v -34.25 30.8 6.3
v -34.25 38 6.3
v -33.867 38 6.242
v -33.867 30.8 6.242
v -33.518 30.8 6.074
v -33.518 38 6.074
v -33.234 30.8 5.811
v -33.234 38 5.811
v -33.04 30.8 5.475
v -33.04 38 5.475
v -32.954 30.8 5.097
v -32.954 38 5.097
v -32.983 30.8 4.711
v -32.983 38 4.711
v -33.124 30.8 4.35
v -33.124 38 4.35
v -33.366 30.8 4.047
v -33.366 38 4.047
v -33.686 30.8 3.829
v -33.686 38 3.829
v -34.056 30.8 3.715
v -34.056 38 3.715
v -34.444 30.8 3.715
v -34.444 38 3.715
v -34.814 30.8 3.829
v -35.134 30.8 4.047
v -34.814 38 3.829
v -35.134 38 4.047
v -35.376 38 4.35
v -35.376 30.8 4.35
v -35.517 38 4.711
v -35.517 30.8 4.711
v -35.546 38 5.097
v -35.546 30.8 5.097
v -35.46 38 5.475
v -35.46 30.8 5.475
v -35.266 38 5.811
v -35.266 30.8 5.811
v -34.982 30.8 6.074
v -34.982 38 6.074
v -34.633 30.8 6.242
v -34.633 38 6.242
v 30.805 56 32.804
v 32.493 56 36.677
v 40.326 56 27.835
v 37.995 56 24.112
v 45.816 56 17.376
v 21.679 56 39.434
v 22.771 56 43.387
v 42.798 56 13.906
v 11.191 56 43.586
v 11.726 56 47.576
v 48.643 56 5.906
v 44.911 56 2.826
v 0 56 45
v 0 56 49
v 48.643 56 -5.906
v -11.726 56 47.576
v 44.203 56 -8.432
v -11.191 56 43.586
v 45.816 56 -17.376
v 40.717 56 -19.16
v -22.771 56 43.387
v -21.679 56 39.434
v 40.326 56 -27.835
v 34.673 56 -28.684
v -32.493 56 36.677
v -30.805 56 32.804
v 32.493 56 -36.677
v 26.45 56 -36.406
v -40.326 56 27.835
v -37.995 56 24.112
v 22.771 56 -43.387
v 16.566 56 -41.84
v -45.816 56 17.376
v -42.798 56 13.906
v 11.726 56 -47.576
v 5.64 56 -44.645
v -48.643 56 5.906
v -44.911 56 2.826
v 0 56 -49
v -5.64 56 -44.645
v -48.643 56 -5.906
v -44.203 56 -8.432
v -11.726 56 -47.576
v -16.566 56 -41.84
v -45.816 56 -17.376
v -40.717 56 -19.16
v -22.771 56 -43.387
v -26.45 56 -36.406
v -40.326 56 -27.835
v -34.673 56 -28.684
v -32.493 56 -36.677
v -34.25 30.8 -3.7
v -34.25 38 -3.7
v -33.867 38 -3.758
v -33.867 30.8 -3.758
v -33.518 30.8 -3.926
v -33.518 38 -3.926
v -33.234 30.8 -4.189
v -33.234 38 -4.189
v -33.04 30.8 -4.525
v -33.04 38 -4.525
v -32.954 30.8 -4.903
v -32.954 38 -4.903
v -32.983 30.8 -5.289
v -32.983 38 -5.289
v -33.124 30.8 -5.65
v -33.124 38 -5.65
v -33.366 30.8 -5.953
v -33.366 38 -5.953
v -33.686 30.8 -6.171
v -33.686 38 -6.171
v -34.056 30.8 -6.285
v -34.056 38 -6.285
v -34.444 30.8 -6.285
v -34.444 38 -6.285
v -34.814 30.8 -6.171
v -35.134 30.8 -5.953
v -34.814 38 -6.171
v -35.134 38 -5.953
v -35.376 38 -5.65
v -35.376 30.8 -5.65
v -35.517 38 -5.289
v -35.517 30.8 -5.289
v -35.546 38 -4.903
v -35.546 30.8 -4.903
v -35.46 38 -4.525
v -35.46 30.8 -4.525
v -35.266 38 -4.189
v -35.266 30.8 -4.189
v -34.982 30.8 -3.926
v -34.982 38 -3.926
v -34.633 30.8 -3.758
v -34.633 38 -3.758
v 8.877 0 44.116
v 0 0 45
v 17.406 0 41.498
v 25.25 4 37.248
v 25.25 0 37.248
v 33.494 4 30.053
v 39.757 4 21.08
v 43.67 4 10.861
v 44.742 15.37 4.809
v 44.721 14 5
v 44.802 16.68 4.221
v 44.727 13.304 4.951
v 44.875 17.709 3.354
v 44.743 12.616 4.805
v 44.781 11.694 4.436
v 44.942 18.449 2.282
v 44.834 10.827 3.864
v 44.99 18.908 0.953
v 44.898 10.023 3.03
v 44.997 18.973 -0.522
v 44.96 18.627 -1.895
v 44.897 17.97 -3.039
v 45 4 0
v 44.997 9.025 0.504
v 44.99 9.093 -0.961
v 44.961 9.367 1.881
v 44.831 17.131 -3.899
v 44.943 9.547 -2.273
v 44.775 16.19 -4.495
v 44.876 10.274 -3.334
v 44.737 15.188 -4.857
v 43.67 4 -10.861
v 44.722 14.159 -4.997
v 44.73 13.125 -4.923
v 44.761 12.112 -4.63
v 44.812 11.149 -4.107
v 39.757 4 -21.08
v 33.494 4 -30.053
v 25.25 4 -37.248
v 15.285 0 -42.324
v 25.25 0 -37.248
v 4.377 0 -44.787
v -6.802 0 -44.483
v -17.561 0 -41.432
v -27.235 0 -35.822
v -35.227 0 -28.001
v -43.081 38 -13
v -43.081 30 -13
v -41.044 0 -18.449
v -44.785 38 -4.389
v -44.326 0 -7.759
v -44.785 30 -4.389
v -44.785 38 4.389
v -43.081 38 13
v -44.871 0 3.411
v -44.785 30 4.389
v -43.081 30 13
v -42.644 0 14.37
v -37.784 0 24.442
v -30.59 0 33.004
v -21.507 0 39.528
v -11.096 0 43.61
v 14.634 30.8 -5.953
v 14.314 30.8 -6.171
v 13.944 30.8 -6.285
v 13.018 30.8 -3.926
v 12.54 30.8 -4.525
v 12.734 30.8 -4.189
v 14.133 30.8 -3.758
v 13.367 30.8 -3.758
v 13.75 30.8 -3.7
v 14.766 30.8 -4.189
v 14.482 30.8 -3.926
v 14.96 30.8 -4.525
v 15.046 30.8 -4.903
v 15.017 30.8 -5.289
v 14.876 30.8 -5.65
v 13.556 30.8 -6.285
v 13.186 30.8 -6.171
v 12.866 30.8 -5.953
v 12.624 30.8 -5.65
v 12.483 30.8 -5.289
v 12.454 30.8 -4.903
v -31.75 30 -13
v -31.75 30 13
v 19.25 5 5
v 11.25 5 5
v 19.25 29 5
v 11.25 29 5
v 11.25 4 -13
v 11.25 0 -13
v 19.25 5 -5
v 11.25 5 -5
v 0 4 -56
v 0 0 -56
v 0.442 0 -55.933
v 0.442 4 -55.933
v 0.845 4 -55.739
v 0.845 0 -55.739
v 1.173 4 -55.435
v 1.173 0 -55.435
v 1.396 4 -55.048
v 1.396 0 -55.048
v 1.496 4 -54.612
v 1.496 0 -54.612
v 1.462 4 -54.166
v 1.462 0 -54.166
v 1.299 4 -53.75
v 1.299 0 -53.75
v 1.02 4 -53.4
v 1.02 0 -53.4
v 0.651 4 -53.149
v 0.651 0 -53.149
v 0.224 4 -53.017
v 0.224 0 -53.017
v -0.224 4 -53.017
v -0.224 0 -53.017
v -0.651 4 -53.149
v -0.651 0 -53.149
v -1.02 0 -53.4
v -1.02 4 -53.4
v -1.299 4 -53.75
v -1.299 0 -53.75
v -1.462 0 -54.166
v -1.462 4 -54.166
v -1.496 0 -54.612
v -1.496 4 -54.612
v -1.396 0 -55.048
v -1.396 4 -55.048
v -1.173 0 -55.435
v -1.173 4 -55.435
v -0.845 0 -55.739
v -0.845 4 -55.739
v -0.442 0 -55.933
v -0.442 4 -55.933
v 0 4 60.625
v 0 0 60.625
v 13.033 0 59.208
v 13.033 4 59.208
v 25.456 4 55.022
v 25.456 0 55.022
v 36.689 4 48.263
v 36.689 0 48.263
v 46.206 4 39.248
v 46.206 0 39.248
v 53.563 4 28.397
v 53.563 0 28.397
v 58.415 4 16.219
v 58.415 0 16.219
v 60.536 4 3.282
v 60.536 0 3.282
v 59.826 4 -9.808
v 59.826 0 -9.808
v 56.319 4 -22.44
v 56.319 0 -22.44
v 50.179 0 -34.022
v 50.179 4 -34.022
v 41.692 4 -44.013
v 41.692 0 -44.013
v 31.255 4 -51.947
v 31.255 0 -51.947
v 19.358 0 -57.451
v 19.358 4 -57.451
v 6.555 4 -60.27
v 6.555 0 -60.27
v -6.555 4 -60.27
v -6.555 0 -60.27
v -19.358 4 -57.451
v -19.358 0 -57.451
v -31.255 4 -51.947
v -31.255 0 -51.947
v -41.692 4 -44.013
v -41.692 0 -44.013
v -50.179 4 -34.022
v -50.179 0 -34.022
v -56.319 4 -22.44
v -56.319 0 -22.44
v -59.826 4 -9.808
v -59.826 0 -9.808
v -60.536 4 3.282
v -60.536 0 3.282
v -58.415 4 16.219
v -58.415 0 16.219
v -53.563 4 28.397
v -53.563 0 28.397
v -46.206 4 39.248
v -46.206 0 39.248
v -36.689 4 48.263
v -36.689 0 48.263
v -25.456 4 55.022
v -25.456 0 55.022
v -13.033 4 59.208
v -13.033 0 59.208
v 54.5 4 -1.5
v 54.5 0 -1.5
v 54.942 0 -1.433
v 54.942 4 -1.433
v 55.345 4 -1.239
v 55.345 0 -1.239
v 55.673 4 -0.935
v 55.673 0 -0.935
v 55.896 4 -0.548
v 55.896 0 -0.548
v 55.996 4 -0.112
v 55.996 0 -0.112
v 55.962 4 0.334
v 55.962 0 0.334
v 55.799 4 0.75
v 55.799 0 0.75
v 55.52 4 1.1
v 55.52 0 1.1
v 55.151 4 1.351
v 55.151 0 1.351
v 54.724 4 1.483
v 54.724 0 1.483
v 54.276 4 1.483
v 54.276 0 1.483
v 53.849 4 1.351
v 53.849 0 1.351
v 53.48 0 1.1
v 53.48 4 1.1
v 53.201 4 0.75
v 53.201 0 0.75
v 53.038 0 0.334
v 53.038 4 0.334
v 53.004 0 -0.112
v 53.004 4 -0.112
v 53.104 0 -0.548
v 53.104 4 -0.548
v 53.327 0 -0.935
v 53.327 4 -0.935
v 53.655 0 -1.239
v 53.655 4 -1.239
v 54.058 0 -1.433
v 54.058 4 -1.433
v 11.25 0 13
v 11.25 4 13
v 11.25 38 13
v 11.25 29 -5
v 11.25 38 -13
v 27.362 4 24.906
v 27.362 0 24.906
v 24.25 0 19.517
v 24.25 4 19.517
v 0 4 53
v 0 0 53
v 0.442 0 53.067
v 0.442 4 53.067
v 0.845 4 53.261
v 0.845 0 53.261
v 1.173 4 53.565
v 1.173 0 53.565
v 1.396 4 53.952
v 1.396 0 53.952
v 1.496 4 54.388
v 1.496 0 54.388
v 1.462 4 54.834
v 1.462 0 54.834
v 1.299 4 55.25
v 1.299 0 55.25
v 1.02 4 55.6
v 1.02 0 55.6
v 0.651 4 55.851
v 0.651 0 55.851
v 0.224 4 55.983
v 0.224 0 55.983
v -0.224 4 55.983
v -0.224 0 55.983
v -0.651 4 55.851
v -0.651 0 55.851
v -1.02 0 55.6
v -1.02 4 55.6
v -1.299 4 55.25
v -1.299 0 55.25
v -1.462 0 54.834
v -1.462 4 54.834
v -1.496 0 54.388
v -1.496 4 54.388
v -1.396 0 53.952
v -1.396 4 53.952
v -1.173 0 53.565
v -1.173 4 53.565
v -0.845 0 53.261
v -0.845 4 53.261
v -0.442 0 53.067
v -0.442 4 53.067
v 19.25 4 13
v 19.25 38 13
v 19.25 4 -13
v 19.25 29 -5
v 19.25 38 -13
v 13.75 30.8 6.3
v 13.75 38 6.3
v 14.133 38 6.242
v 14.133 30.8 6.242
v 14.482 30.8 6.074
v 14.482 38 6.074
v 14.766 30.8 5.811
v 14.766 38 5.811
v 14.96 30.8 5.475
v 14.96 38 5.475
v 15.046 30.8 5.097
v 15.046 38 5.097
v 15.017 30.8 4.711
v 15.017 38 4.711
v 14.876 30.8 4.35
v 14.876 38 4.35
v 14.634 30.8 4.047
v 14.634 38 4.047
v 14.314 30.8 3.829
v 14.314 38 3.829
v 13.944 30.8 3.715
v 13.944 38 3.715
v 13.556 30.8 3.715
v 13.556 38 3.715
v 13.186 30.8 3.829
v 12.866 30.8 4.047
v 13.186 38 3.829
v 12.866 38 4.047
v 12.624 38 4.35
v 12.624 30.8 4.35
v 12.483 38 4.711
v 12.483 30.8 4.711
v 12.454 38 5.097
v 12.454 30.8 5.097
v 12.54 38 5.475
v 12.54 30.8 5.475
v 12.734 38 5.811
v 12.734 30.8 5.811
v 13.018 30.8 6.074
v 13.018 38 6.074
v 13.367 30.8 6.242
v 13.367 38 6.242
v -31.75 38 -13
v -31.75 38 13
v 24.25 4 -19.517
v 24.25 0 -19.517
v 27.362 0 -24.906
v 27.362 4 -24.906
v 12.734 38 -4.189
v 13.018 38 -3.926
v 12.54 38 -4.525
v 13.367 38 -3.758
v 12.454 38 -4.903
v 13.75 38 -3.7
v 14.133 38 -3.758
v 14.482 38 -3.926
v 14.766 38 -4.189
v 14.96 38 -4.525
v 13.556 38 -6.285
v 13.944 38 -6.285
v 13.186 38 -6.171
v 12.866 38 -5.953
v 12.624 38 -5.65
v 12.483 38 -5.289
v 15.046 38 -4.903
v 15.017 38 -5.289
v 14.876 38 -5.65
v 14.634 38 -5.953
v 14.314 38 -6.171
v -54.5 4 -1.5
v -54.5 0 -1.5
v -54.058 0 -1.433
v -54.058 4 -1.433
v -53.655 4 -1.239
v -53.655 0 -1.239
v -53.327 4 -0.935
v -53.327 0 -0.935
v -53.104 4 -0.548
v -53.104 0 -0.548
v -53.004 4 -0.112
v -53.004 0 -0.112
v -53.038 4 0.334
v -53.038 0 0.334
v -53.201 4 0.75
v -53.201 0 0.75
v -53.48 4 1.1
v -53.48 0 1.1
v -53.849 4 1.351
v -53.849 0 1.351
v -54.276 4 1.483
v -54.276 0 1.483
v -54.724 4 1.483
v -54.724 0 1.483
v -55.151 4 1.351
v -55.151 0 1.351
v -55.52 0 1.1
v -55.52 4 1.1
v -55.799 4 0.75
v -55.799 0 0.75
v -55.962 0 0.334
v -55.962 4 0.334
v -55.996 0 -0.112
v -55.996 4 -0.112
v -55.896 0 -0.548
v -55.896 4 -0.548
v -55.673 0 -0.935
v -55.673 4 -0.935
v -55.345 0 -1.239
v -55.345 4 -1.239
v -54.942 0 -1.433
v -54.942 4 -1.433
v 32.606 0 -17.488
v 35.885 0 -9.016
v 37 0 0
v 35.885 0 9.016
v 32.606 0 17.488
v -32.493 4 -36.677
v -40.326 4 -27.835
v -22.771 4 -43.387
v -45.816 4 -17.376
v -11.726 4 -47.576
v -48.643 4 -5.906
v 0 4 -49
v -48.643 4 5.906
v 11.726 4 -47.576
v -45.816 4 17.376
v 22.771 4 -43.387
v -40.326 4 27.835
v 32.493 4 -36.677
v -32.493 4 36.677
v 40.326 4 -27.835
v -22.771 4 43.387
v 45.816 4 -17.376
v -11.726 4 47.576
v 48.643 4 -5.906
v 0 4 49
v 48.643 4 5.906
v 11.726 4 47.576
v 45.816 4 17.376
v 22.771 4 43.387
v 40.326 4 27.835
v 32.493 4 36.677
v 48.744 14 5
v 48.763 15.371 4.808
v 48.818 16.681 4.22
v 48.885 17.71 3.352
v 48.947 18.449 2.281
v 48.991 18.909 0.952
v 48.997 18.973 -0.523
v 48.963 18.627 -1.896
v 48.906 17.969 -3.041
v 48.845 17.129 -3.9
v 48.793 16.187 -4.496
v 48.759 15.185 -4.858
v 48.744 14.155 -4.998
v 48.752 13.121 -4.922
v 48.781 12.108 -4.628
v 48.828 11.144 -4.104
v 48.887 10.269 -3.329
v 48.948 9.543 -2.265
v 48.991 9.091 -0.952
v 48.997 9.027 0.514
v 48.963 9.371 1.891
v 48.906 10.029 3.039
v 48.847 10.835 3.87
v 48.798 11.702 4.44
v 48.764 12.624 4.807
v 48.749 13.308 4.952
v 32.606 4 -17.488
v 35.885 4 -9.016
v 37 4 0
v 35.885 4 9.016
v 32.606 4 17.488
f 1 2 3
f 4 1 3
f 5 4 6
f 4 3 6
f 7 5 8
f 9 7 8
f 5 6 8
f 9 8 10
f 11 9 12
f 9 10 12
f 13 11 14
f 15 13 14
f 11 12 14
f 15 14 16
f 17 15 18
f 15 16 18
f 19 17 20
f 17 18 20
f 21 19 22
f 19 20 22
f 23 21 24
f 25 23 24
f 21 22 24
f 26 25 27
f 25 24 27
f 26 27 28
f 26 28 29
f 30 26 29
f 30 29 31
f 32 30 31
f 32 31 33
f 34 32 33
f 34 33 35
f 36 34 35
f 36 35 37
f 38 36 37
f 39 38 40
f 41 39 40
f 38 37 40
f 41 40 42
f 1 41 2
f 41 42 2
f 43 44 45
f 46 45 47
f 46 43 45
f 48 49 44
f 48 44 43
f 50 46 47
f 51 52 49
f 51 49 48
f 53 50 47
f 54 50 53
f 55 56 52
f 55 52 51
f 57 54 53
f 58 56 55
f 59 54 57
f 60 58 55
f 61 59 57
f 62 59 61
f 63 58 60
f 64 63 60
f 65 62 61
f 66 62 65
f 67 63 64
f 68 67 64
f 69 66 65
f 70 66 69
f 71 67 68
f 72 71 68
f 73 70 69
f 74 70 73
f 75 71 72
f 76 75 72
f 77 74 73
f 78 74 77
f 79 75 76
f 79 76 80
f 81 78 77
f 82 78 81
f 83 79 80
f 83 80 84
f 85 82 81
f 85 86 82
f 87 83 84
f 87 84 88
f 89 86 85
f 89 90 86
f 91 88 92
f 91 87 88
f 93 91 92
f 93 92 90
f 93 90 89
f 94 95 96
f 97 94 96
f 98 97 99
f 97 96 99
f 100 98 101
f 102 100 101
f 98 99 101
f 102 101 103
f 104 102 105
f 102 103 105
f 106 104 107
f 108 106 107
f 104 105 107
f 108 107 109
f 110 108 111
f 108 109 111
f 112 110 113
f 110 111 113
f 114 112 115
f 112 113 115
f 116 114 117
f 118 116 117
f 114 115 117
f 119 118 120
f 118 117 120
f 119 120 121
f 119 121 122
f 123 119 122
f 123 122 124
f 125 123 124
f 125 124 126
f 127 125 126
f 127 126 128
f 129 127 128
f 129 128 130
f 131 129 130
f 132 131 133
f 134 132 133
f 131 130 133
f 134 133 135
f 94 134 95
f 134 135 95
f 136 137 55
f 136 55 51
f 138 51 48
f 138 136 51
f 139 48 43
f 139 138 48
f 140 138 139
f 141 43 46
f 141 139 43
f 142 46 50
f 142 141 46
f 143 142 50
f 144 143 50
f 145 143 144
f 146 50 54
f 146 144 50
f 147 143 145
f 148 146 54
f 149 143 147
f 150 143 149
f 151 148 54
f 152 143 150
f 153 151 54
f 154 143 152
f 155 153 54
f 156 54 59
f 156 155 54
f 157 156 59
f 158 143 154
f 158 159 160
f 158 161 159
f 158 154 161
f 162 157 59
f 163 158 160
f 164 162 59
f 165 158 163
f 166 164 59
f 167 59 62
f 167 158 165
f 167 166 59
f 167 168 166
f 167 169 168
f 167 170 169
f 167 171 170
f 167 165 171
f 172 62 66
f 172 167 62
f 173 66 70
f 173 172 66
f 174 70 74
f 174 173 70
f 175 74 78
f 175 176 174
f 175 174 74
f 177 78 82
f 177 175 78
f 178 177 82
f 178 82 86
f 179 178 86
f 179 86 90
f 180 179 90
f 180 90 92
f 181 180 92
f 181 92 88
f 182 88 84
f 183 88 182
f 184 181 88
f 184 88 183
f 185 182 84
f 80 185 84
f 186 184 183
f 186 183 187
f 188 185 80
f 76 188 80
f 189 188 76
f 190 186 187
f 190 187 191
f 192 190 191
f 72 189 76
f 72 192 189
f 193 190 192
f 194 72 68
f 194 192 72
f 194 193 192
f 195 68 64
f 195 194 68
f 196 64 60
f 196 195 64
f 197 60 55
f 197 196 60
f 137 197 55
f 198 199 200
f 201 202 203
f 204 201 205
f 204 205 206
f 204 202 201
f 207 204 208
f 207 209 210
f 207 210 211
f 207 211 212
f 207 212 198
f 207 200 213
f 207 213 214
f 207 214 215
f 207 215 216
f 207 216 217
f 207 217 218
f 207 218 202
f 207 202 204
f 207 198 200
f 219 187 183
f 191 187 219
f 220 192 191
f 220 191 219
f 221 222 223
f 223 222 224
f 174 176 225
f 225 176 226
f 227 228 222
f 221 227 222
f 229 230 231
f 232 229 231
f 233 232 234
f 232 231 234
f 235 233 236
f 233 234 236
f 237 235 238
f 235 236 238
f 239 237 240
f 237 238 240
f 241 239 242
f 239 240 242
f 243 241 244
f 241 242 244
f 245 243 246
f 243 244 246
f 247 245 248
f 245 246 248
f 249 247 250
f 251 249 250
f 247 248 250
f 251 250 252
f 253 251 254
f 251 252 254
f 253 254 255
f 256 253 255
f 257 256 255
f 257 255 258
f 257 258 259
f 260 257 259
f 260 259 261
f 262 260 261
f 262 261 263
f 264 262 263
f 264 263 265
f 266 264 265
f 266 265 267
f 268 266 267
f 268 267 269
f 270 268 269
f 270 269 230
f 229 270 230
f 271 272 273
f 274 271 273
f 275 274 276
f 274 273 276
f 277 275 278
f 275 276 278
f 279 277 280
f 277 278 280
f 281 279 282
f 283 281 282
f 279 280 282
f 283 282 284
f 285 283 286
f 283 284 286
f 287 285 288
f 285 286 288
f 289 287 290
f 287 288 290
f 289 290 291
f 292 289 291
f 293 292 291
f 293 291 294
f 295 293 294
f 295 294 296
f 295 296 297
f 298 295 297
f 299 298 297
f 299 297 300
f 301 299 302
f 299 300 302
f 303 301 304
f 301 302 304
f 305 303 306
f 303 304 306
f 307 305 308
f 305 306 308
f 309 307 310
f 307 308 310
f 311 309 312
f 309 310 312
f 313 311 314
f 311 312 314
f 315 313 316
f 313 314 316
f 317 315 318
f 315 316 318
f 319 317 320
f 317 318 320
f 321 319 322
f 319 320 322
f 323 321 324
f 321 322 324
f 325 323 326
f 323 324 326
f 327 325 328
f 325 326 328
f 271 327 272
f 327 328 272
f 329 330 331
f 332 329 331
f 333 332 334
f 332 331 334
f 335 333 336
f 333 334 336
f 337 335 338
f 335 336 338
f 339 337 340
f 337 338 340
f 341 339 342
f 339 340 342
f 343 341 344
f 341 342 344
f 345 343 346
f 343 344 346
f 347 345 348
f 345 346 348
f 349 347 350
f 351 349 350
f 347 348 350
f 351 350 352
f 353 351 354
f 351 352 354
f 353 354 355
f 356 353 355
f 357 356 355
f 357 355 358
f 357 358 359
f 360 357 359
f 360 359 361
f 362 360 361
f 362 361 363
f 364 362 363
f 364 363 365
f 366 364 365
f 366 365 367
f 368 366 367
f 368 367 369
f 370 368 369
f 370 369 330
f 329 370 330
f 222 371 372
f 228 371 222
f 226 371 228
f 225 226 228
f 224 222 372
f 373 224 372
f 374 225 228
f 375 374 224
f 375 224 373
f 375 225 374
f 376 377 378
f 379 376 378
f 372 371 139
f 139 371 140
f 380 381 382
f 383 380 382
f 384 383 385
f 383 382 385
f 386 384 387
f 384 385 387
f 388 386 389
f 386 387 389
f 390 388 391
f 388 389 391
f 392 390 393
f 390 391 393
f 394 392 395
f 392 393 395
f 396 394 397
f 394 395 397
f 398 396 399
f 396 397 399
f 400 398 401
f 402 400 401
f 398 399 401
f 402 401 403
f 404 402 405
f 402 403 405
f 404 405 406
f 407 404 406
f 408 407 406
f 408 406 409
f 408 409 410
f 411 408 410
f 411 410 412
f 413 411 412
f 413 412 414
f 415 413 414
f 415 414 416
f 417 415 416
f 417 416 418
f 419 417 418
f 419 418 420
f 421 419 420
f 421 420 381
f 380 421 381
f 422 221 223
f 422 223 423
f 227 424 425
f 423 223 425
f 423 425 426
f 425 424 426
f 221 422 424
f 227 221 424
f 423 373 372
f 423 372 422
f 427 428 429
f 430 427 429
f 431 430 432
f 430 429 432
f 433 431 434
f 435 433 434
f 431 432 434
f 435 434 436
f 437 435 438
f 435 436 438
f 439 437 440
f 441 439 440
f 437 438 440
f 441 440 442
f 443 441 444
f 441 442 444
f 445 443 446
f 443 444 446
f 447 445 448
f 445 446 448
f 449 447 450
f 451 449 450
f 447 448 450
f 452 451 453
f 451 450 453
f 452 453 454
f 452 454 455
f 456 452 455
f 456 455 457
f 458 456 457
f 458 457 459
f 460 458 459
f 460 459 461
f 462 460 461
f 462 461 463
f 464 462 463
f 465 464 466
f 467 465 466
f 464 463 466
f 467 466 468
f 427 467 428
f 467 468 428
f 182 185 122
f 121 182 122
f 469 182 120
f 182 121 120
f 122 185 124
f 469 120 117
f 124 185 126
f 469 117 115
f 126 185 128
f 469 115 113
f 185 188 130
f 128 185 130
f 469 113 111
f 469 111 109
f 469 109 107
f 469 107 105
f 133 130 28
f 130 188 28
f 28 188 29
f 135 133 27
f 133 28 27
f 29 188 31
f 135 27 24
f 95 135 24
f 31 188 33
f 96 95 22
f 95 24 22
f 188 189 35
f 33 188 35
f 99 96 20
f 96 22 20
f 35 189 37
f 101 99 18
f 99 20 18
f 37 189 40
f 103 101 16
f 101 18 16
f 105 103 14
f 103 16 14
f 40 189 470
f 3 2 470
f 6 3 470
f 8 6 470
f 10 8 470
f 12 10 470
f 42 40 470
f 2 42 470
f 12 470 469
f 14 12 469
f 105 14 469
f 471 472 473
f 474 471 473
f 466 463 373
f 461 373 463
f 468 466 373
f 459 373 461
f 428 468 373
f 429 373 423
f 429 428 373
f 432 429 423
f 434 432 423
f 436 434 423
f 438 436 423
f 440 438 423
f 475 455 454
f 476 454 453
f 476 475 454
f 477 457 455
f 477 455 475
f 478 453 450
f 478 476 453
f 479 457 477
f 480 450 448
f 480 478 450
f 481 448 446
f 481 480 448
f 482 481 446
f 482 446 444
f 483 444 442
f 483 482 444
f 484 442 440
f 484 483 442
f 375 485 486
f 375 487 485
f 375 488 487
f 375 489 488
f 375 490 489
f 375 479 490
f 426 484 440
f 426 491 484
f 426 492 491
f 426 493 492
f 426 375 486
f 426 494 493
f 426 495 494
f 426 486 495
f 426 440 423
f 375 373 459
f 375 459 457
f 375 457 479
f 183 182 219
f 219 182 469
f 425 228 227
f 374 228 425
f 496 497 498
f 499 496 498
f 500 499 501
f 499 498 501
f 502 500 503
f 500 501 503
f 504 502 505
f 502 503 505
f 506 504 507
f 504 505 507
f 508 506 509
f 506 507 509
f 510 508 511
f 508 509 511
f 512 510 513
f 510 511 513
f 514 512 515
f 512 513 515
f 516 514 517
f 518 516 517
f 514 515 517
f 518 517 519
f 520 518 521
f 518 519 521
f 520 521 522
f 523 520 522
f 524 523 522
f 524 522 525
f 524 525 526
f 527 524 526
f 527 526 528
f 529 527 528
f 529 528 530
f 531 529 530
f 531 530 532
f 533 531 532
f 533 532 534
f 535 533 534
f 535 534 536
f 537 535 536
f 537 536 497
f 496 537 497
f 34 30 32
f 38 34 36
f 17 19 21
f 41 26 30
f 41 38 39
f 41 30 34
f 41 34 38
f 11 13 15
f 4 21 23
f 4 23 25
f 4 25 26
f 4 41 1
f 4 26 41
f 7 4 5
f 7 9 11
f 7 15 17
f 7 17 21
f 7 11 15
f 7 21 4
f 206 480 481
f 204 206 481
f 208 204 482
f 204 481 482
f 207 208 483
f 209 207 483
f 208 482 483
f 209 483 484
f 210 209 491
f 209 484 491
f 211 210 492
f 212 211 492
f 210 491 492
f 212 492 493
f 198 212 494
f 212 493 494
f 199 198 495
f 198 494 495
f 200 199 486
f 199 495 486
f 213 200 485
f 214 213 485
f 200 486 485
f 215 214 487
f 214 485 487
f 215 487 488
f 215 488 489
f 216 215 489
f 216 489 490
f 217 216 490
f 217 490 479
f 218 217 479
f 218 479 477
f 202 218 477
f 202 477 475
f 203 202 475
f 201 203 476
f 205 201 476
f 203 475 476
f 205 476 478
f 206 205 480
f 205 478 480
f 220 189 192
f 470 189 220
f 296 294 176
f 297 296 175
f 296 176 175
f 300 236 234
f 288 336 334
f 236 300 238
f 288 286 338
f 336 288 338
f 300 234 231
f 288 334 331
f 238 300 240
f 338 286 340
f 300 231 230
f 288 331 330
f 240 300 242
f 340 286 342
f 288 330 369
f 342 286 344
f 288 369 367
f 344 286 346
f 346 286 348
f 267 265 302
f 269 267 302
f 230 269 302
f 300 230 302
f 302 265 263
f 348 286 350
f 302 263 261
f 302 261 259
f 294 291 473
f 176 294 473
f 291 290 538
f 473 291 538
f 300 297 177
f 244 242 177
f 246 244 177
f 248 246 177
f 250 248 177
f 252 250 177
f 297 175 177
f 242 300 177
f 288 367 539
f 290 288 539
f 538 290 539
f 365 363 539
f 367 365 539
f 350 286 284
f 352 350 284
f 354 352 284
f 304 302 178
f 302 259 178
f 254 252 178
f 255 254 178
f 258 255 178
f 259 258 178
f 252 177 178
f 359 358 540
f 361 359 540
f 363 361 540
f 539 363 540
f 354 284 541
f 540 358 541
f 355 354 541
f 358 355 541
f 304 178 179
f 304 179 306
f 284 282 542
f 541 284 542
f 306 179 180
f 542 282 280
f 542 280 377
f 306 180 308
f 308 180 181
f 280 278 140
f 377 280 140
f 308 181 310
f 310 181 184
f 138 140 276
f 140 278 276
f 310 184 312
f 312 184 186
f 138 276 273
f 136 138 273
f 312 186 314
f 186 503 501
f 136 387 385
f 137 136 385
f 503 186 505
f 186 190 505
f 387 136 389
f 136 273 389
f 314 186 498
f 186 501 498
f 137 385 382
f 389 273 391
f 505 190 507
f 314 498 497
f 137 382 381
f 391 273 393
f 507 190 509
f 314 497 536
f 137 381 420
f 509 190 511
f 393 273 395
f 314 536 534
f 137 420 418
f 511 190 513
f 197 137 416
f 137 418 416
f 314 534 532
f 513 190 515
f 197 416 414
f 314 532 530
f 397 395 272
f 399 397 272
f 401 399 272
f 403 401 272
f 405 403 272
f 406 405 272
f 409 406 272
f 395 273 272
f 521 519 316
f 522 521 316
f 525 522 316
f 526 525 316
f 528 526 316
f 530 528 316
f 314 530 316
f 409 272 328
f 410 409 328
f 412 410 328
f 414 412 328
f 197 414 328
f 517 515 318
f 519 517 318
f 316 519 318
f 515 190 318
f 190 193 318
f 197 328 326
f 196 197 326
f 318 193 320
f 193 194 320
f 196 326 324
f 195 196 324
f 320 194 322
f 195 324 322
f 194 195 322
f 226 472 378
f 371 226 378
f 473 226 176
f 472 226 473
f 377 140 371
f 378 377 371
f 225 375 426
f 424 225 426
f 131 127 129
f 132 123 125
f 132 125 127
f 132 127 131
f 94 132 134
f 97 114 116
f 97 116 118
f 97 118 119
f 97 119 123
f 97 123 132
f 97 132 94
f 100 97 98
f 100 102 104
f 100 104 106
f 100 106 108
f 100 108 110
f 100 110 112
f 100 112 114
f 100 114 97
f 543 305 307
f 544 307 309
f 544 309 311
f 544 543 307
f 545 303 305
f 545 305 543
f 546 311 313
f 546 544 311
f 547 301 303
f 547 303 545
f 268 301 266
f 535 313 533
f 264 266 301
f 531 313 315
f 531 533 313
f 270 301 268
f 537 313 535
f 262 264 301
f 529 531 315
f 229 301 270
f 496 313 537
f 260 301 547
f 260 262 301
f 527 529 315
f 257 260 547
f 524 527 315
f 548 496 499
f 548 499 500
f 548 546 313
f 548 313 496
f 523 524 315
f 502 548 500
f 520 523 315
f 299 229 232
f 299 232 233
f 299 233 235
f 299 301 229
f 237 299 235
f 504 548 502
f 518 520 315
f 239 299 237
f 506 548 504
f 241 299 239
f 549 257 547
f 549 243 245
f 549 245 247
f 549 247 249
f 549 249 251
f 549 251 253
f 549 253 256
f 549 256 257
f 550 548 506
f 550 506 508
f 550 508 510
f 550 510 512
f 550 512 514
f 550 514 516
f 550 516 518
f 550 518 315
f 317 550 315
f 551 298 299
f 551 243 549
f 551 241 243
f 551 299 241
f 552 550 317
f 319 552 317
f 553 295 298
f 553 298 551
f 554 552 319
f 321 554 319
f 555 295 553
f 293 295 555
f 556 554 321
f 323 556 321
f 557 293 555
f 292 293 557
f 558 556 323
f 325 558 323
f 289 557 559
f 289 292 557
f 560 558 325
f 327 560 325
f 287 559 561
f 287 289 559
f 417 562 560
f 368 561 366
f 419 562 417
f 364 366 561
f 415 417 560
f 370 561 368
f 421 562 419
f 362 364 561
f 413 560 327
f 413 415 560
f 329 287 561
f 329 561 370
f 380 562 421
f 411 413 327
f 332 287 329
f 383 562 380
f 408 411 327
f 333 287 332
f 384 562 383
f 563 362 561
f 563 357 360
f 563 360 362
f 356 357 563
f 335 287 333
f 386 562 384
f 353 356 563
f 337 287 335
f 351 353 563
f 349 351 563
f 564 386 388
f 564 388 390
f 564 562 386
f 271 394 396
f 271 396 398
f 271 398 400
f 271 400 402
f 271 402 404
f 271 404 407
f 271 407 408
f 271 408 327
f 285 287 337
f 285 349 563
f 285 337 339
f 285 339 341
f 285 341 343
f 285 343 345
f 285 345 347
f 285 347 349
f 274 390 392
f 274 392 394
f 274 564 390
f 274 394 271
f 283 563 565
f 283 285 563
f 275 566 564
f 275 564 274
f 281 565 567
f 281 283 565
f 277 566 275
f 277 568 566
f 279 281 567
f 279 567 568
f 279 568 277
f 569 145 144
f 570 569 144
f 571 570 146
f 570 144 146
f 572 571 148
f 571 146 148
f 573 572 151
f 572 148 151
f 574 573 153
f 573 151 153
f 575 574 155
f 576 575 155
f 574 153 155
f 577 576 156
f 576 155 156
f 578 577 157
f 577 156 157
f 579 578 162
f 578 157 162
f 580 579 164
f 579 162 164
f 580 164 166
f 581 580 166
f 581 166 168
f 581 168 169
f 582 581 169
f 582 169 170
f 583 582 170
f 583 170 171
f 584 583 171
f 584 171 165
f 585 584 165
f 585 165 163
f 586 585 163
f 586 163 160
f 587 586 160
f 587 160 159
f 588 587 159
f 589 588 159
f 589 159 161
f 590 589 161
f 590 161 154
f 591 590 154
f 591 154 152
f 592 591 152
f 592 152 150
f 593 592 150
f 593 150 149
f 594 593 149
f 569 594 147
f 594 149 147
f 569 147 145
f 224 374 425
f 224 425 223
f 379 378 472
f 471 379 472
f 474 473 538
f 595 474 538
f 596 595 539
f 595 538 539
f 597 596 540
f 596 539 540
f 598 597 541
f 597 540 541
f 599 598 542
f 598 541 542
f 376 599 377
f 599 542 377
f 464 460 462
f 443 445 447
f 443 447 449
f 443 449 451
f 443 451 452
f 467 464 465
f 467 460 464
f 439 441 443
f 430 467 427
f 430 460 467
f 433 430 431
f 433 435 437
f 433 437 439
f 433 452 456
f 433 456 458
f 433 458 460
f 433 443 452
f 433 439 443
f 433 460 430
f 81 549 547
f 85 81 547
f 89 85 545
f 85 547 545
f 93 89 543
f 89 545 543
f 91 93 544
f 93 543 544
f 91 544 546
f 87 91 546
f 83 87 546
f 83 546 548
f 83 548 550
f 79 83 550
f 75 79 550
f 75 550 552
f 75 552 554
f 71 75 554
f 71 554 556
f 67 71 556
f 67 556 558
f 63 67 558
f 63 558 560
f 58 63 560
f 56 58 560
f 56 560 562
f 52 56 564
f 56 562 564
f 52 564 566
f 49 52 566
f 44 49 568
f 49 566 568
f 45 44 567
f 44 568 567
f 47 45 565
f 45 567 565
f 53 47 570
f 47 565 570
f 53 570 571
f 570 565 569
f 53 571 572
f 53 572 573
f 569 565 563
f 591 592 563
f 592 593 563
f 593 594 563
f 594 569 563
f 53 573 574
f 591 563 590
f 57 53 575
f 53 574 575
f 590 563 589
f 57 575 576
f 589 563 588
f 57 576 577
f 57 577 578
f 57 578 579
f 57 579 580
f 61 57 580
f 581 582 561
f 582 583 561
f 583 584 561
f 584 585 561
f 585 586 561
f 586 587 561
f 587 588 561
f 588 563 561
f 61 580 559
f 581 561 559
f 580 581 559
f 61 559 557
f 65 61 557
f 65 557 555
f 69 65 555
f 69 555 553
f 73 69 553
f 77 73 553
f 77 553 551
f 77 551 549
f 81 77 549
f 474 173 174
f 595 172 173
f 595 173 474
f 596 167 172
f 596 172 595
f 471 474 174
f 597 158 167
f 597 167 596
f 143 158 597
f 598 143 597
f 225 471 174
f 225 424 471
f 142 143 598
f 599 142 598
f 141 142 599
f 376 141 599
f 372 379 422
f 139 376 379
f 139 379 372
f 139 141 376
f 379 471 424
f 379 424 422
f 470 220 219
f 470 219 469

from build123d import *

# Parameters (mm, degrees)
SKETCH1_R           = 60.625
SKETCH1_R_2         = 45
BOSS_EXTRUDE1_DEPTH = 4
SKETCH2_R           = 49
SKETCH2_R_2         = 45
BOSS_EXTRUDE2_DEPTH = 52
SKETCH3_W           = 8
SKETCH3_H           = 38
SKETCH3_W_2         = 15
SKETCH3_H_2         = 8
BOSS_EXTRUDE3_DEPTH = 13
SKETCH4_R           = 1.3
CUT_EXTRUDE1_DEPTH  = 7.2
BOSS_EXTRUDE4_DEPTH = 4
SKETCH7_W           = 10
SKETCH7_H           = 24
CUT_EXTRUDE2_DEPTH  = 8
SKETCH8_R           = 5
CUT_EXTRUDE3_DEPTH  = 110.441337026
CUT_EXTRUDE4_REACH  = 104.405
SKETCH9_R           = 1.5


with BuildPart() as part:
    # Sketch1 → Boss-Extrude1 (new body)
    with BuildSketch(Plane(origin=(0, 0, 0), x_dir=(1, 0, 0), z_dir=(0, 1, 0))):
        with Locations(Location((0, 0, 0), (0, 0, 270))):
            Circle(SKETCH1_R)
        with Locations(Location((0, 0, 0), (0, 0, 270))):
            Circle(SKETCH1_R_2, mode=Mode.SUBTRACT)
    extrude(amount=BOSS_EXTRUDE1_DEPTH)

    # Sketch2 → Boss-Extrude2 (add)
    with BuildSketch(Plane(origin=(0, 4, 0), x_dir=(1, 0, 0), z_dir=(0, 1, 0))):
        with Locations(Location((0, 0, 0), (0, 0, 90))):
            Circle(SKETCH2_R)
        with Locations(Location((0, 0, 0), (0, 0, 270))):
            Circle(SKETCH2_R_2, mode=Mode.SUBTRACT)
    extrude(amount=BOSS_EXTRUDE2_DEPTH)

    # Sketch3 → Boss-Extrude3 (add, symmetric)
    with BuildSketch(Plane.XY):
        with Locations((15.25, 19)):
            Rectangle(SKETCH3_W, SKETCH3_H)
        with Locations((-39.25, 34)):
            Rectangle(SKETCH3_W_2, SKETCH3_H_2)
    extrude(amount=BOSS_EXTRUDE3_DEPTH, both=True)


with BuildPart() as boss_extrude3_piece_1:
    # of the separate pieces the step leaves, piece 1, a body of its own (boss_extrude3_pieces)
    add(part.part.solids().sort_by_distance((0, 0, 60.625))[0])


with BuildPart() as boss_extrude3_piece_2:
    # of the separate pieces the step leaves, piece 2, a body of its own (boss_extrude3_pieces)
    add(part.part.solids().sort_by_distance((11.25, 0, -13))[0])


with BuildPart() as cut_extrude1_tool:
    # Sketch4 → Cut-Extrude1 (new body)
    with BuildSketch(Plane(origin=(0, 38, 0), x_dir=(1, 0, 0), z_dir=(0, 1, 0))):
        with Locations(Location((13.75, 5, 0), (0, 0, 270))):
            Circle(SKETCH4_R)
        with Locations(Location((13.75, -5, 0), (0, 0, 270))):
            Circle(SKETCH4_R)
        with Locations(Location((-34.25, 5, 0), (0, 0, 270))):
            Circle(SKETCH4_R)
        with Locations(Location((-34.25, -5, 0), (0, 0, 270))):
            Circle(SKETCH4_R)
    extrude(amount=-CUT_EXTRUDE1_DEPTH)


with BuildPart() as boss_extrude3_piece_1_1:
    add(boss_extrude3_piece_1.part)

    # Cut-Extrude1: cut by cut_extrude1_tool
    add(cut_extrude1_tool.part, mode=Mode.SUBTRACT)



with BuildPart() as boss_extrude3_piece_2_1:
    add(boss_extrude3_piece_2.part)

    # Cut-Extrude1: cut by cut_extrude1_tool
    add(cut_extrude1_tool.part, mode=Mode.SUBTRACT)


with BuildPart() as boss_extrude3_piece_1_2:
    add(boss_extrude3_piece_1_1.part)

    add(boss_extrude3_piece_2_1.part)  # Boss-Extrude4 merges Boss-Extrude3 piece 2
    # Sketch5 → Boss-Extrude4 (add)
    with BuildSketch(Plane.XZ):
        with BuildLine():
            Line((11.25, 13), (25.249838503, 37.248431585))
            ThreePointArc((25.249838503, 37.248431585), (45, 0), (25.249838503, -37.248431585))
            Line((25.249838503, -37.248431585), (11.25, -13))
            Line((11.25, -13), (11.25, 13))
        make_face()
        with BuildLine():
            Line((24.25, -19.516660498), (27.361802413, -24.906460381))
            ThreePointArc((27.361802413, -24.906460381), (37, 0), (27.361802413, 24.906460381))
            Line((27.361802413, 24.906460381), (24.25, 19.516660498))
            Line((24.25, 19.516660498), (24.25, -19.516660498))
        make_face(mode=Mode.SUBTRACT)
    extrude(amount=-BOSS_EXTRUDE4_DEPTH)

    # Sketch7 → Cut-Extrude2 (cut)
    with BuildSketch(Plane.ZY.offset(-11.25)):
        with Locations((0, 17)):
            Rectangle(SKETCH7_W, SKETCH7_H)
    extrude(amount=-CUT_EXTRUDE2_DEPTH, mode=Mode.SUBTRACT)

    # Sketch8 → Cut-Extrude3 (cut, through all)
    with BuildSketch(Plane.ZY.offset(-11.25)):
        with Locations((0, 14)):
            Circle(SKETCH8_R)
    extrude(amount=-CUT_EXTRUDE3_DEPTH, mode=Mode.SUBTRACT)

    # Sketch9 → Cut-Extrude4 (cut, up to next)
    with BuildSketch(Plane.XZ, mode=Mode.PRIVATE) as cut_extrude4_sk1:
        with Locations(Location((54.5, 0, 0), (0, 0, 270))):
            Circle(SKETCH9_R)
    cut_extrude4_tool1 = extrude(cut_extrude4_sk1.sketch, amount=-CUT_EXTRUDE4_REACH, mode=Mode.PRIVATE) & boss_extrude3_piece_1_2.part
    # Sketch9 → Cut-Extrude4 (cut, up to next)
    with BuildSketch(Plane.XZ, mode=Mode.PRIVATE) as cut_extrude4_sk2:
        with Locations(Location((0, -54.5, 0), (0, 0, 270))):
            Circle(SKETCH9_R)
    cut_extrude4_tool2 = extrude(cut_extrude4_sk2.sketch, amount=-CUT_EXTRUDE4_REACH, mode=Mode.PRIVATE) & boss_extrude3_piece_1_2.part
    # Sketch9 → Cut-Extrude4 (cut, up to next)
    with BuildSketch(Plane.XZ, mode=Mode.PRIVATE) as cut_extrude4_sk3:
        with Locations(Location((-54.5, 0, 0), (0, 0, 270))):
            Circle(SKETCH9_R)
    cut_extrude4_tool3 = extrude(cut_extrude4_sk3.sketch, amount=-CUT_EXTRUDE4_REACH, mode=Mode.PRIVATE) & boss_extrude3_piece_1_2.part
    # Sketch9 → Cut-Extrude4 (cut, up to next)
    with BuildSketch(Plane.XZ, mode=Mode.PRIVATE) as cut_extrude4_sk4:
        with Locations(Location((0, 54.5, 0), (0, 0, 270))):
            Circle(SKETCH9_R)
    cut_extrude4_tool4 = extrude(cut_extrude4_sk4.sketch, amount=-CUT_EXTRUDE4_REACH, mode=Mode.PRIVATE) & boss_extrude3_piece_1_2.part
    add(cut_extrude4_tool1.solids().sort_by_distance((54.5, 0, 0))[0], mode=Mode.SUBTRACT)
    add(cut_extrude4_tool2.solids().sort_by_distance((0, 0, -54.5))[0], mode=Mode.SUBTRACT)
    add(cut_extrude4_tool3.solids().sort_by_distance((-54.5, 0, 0))[0], mode=Mode.SUBTRACT)
    add(cut_extrude4_tool4.solids().sort_by_distance((0, 0, 54.5))[0], mode=Mode.SUBTRACT)


solid = boss_extrude3_piece_1_2.part
